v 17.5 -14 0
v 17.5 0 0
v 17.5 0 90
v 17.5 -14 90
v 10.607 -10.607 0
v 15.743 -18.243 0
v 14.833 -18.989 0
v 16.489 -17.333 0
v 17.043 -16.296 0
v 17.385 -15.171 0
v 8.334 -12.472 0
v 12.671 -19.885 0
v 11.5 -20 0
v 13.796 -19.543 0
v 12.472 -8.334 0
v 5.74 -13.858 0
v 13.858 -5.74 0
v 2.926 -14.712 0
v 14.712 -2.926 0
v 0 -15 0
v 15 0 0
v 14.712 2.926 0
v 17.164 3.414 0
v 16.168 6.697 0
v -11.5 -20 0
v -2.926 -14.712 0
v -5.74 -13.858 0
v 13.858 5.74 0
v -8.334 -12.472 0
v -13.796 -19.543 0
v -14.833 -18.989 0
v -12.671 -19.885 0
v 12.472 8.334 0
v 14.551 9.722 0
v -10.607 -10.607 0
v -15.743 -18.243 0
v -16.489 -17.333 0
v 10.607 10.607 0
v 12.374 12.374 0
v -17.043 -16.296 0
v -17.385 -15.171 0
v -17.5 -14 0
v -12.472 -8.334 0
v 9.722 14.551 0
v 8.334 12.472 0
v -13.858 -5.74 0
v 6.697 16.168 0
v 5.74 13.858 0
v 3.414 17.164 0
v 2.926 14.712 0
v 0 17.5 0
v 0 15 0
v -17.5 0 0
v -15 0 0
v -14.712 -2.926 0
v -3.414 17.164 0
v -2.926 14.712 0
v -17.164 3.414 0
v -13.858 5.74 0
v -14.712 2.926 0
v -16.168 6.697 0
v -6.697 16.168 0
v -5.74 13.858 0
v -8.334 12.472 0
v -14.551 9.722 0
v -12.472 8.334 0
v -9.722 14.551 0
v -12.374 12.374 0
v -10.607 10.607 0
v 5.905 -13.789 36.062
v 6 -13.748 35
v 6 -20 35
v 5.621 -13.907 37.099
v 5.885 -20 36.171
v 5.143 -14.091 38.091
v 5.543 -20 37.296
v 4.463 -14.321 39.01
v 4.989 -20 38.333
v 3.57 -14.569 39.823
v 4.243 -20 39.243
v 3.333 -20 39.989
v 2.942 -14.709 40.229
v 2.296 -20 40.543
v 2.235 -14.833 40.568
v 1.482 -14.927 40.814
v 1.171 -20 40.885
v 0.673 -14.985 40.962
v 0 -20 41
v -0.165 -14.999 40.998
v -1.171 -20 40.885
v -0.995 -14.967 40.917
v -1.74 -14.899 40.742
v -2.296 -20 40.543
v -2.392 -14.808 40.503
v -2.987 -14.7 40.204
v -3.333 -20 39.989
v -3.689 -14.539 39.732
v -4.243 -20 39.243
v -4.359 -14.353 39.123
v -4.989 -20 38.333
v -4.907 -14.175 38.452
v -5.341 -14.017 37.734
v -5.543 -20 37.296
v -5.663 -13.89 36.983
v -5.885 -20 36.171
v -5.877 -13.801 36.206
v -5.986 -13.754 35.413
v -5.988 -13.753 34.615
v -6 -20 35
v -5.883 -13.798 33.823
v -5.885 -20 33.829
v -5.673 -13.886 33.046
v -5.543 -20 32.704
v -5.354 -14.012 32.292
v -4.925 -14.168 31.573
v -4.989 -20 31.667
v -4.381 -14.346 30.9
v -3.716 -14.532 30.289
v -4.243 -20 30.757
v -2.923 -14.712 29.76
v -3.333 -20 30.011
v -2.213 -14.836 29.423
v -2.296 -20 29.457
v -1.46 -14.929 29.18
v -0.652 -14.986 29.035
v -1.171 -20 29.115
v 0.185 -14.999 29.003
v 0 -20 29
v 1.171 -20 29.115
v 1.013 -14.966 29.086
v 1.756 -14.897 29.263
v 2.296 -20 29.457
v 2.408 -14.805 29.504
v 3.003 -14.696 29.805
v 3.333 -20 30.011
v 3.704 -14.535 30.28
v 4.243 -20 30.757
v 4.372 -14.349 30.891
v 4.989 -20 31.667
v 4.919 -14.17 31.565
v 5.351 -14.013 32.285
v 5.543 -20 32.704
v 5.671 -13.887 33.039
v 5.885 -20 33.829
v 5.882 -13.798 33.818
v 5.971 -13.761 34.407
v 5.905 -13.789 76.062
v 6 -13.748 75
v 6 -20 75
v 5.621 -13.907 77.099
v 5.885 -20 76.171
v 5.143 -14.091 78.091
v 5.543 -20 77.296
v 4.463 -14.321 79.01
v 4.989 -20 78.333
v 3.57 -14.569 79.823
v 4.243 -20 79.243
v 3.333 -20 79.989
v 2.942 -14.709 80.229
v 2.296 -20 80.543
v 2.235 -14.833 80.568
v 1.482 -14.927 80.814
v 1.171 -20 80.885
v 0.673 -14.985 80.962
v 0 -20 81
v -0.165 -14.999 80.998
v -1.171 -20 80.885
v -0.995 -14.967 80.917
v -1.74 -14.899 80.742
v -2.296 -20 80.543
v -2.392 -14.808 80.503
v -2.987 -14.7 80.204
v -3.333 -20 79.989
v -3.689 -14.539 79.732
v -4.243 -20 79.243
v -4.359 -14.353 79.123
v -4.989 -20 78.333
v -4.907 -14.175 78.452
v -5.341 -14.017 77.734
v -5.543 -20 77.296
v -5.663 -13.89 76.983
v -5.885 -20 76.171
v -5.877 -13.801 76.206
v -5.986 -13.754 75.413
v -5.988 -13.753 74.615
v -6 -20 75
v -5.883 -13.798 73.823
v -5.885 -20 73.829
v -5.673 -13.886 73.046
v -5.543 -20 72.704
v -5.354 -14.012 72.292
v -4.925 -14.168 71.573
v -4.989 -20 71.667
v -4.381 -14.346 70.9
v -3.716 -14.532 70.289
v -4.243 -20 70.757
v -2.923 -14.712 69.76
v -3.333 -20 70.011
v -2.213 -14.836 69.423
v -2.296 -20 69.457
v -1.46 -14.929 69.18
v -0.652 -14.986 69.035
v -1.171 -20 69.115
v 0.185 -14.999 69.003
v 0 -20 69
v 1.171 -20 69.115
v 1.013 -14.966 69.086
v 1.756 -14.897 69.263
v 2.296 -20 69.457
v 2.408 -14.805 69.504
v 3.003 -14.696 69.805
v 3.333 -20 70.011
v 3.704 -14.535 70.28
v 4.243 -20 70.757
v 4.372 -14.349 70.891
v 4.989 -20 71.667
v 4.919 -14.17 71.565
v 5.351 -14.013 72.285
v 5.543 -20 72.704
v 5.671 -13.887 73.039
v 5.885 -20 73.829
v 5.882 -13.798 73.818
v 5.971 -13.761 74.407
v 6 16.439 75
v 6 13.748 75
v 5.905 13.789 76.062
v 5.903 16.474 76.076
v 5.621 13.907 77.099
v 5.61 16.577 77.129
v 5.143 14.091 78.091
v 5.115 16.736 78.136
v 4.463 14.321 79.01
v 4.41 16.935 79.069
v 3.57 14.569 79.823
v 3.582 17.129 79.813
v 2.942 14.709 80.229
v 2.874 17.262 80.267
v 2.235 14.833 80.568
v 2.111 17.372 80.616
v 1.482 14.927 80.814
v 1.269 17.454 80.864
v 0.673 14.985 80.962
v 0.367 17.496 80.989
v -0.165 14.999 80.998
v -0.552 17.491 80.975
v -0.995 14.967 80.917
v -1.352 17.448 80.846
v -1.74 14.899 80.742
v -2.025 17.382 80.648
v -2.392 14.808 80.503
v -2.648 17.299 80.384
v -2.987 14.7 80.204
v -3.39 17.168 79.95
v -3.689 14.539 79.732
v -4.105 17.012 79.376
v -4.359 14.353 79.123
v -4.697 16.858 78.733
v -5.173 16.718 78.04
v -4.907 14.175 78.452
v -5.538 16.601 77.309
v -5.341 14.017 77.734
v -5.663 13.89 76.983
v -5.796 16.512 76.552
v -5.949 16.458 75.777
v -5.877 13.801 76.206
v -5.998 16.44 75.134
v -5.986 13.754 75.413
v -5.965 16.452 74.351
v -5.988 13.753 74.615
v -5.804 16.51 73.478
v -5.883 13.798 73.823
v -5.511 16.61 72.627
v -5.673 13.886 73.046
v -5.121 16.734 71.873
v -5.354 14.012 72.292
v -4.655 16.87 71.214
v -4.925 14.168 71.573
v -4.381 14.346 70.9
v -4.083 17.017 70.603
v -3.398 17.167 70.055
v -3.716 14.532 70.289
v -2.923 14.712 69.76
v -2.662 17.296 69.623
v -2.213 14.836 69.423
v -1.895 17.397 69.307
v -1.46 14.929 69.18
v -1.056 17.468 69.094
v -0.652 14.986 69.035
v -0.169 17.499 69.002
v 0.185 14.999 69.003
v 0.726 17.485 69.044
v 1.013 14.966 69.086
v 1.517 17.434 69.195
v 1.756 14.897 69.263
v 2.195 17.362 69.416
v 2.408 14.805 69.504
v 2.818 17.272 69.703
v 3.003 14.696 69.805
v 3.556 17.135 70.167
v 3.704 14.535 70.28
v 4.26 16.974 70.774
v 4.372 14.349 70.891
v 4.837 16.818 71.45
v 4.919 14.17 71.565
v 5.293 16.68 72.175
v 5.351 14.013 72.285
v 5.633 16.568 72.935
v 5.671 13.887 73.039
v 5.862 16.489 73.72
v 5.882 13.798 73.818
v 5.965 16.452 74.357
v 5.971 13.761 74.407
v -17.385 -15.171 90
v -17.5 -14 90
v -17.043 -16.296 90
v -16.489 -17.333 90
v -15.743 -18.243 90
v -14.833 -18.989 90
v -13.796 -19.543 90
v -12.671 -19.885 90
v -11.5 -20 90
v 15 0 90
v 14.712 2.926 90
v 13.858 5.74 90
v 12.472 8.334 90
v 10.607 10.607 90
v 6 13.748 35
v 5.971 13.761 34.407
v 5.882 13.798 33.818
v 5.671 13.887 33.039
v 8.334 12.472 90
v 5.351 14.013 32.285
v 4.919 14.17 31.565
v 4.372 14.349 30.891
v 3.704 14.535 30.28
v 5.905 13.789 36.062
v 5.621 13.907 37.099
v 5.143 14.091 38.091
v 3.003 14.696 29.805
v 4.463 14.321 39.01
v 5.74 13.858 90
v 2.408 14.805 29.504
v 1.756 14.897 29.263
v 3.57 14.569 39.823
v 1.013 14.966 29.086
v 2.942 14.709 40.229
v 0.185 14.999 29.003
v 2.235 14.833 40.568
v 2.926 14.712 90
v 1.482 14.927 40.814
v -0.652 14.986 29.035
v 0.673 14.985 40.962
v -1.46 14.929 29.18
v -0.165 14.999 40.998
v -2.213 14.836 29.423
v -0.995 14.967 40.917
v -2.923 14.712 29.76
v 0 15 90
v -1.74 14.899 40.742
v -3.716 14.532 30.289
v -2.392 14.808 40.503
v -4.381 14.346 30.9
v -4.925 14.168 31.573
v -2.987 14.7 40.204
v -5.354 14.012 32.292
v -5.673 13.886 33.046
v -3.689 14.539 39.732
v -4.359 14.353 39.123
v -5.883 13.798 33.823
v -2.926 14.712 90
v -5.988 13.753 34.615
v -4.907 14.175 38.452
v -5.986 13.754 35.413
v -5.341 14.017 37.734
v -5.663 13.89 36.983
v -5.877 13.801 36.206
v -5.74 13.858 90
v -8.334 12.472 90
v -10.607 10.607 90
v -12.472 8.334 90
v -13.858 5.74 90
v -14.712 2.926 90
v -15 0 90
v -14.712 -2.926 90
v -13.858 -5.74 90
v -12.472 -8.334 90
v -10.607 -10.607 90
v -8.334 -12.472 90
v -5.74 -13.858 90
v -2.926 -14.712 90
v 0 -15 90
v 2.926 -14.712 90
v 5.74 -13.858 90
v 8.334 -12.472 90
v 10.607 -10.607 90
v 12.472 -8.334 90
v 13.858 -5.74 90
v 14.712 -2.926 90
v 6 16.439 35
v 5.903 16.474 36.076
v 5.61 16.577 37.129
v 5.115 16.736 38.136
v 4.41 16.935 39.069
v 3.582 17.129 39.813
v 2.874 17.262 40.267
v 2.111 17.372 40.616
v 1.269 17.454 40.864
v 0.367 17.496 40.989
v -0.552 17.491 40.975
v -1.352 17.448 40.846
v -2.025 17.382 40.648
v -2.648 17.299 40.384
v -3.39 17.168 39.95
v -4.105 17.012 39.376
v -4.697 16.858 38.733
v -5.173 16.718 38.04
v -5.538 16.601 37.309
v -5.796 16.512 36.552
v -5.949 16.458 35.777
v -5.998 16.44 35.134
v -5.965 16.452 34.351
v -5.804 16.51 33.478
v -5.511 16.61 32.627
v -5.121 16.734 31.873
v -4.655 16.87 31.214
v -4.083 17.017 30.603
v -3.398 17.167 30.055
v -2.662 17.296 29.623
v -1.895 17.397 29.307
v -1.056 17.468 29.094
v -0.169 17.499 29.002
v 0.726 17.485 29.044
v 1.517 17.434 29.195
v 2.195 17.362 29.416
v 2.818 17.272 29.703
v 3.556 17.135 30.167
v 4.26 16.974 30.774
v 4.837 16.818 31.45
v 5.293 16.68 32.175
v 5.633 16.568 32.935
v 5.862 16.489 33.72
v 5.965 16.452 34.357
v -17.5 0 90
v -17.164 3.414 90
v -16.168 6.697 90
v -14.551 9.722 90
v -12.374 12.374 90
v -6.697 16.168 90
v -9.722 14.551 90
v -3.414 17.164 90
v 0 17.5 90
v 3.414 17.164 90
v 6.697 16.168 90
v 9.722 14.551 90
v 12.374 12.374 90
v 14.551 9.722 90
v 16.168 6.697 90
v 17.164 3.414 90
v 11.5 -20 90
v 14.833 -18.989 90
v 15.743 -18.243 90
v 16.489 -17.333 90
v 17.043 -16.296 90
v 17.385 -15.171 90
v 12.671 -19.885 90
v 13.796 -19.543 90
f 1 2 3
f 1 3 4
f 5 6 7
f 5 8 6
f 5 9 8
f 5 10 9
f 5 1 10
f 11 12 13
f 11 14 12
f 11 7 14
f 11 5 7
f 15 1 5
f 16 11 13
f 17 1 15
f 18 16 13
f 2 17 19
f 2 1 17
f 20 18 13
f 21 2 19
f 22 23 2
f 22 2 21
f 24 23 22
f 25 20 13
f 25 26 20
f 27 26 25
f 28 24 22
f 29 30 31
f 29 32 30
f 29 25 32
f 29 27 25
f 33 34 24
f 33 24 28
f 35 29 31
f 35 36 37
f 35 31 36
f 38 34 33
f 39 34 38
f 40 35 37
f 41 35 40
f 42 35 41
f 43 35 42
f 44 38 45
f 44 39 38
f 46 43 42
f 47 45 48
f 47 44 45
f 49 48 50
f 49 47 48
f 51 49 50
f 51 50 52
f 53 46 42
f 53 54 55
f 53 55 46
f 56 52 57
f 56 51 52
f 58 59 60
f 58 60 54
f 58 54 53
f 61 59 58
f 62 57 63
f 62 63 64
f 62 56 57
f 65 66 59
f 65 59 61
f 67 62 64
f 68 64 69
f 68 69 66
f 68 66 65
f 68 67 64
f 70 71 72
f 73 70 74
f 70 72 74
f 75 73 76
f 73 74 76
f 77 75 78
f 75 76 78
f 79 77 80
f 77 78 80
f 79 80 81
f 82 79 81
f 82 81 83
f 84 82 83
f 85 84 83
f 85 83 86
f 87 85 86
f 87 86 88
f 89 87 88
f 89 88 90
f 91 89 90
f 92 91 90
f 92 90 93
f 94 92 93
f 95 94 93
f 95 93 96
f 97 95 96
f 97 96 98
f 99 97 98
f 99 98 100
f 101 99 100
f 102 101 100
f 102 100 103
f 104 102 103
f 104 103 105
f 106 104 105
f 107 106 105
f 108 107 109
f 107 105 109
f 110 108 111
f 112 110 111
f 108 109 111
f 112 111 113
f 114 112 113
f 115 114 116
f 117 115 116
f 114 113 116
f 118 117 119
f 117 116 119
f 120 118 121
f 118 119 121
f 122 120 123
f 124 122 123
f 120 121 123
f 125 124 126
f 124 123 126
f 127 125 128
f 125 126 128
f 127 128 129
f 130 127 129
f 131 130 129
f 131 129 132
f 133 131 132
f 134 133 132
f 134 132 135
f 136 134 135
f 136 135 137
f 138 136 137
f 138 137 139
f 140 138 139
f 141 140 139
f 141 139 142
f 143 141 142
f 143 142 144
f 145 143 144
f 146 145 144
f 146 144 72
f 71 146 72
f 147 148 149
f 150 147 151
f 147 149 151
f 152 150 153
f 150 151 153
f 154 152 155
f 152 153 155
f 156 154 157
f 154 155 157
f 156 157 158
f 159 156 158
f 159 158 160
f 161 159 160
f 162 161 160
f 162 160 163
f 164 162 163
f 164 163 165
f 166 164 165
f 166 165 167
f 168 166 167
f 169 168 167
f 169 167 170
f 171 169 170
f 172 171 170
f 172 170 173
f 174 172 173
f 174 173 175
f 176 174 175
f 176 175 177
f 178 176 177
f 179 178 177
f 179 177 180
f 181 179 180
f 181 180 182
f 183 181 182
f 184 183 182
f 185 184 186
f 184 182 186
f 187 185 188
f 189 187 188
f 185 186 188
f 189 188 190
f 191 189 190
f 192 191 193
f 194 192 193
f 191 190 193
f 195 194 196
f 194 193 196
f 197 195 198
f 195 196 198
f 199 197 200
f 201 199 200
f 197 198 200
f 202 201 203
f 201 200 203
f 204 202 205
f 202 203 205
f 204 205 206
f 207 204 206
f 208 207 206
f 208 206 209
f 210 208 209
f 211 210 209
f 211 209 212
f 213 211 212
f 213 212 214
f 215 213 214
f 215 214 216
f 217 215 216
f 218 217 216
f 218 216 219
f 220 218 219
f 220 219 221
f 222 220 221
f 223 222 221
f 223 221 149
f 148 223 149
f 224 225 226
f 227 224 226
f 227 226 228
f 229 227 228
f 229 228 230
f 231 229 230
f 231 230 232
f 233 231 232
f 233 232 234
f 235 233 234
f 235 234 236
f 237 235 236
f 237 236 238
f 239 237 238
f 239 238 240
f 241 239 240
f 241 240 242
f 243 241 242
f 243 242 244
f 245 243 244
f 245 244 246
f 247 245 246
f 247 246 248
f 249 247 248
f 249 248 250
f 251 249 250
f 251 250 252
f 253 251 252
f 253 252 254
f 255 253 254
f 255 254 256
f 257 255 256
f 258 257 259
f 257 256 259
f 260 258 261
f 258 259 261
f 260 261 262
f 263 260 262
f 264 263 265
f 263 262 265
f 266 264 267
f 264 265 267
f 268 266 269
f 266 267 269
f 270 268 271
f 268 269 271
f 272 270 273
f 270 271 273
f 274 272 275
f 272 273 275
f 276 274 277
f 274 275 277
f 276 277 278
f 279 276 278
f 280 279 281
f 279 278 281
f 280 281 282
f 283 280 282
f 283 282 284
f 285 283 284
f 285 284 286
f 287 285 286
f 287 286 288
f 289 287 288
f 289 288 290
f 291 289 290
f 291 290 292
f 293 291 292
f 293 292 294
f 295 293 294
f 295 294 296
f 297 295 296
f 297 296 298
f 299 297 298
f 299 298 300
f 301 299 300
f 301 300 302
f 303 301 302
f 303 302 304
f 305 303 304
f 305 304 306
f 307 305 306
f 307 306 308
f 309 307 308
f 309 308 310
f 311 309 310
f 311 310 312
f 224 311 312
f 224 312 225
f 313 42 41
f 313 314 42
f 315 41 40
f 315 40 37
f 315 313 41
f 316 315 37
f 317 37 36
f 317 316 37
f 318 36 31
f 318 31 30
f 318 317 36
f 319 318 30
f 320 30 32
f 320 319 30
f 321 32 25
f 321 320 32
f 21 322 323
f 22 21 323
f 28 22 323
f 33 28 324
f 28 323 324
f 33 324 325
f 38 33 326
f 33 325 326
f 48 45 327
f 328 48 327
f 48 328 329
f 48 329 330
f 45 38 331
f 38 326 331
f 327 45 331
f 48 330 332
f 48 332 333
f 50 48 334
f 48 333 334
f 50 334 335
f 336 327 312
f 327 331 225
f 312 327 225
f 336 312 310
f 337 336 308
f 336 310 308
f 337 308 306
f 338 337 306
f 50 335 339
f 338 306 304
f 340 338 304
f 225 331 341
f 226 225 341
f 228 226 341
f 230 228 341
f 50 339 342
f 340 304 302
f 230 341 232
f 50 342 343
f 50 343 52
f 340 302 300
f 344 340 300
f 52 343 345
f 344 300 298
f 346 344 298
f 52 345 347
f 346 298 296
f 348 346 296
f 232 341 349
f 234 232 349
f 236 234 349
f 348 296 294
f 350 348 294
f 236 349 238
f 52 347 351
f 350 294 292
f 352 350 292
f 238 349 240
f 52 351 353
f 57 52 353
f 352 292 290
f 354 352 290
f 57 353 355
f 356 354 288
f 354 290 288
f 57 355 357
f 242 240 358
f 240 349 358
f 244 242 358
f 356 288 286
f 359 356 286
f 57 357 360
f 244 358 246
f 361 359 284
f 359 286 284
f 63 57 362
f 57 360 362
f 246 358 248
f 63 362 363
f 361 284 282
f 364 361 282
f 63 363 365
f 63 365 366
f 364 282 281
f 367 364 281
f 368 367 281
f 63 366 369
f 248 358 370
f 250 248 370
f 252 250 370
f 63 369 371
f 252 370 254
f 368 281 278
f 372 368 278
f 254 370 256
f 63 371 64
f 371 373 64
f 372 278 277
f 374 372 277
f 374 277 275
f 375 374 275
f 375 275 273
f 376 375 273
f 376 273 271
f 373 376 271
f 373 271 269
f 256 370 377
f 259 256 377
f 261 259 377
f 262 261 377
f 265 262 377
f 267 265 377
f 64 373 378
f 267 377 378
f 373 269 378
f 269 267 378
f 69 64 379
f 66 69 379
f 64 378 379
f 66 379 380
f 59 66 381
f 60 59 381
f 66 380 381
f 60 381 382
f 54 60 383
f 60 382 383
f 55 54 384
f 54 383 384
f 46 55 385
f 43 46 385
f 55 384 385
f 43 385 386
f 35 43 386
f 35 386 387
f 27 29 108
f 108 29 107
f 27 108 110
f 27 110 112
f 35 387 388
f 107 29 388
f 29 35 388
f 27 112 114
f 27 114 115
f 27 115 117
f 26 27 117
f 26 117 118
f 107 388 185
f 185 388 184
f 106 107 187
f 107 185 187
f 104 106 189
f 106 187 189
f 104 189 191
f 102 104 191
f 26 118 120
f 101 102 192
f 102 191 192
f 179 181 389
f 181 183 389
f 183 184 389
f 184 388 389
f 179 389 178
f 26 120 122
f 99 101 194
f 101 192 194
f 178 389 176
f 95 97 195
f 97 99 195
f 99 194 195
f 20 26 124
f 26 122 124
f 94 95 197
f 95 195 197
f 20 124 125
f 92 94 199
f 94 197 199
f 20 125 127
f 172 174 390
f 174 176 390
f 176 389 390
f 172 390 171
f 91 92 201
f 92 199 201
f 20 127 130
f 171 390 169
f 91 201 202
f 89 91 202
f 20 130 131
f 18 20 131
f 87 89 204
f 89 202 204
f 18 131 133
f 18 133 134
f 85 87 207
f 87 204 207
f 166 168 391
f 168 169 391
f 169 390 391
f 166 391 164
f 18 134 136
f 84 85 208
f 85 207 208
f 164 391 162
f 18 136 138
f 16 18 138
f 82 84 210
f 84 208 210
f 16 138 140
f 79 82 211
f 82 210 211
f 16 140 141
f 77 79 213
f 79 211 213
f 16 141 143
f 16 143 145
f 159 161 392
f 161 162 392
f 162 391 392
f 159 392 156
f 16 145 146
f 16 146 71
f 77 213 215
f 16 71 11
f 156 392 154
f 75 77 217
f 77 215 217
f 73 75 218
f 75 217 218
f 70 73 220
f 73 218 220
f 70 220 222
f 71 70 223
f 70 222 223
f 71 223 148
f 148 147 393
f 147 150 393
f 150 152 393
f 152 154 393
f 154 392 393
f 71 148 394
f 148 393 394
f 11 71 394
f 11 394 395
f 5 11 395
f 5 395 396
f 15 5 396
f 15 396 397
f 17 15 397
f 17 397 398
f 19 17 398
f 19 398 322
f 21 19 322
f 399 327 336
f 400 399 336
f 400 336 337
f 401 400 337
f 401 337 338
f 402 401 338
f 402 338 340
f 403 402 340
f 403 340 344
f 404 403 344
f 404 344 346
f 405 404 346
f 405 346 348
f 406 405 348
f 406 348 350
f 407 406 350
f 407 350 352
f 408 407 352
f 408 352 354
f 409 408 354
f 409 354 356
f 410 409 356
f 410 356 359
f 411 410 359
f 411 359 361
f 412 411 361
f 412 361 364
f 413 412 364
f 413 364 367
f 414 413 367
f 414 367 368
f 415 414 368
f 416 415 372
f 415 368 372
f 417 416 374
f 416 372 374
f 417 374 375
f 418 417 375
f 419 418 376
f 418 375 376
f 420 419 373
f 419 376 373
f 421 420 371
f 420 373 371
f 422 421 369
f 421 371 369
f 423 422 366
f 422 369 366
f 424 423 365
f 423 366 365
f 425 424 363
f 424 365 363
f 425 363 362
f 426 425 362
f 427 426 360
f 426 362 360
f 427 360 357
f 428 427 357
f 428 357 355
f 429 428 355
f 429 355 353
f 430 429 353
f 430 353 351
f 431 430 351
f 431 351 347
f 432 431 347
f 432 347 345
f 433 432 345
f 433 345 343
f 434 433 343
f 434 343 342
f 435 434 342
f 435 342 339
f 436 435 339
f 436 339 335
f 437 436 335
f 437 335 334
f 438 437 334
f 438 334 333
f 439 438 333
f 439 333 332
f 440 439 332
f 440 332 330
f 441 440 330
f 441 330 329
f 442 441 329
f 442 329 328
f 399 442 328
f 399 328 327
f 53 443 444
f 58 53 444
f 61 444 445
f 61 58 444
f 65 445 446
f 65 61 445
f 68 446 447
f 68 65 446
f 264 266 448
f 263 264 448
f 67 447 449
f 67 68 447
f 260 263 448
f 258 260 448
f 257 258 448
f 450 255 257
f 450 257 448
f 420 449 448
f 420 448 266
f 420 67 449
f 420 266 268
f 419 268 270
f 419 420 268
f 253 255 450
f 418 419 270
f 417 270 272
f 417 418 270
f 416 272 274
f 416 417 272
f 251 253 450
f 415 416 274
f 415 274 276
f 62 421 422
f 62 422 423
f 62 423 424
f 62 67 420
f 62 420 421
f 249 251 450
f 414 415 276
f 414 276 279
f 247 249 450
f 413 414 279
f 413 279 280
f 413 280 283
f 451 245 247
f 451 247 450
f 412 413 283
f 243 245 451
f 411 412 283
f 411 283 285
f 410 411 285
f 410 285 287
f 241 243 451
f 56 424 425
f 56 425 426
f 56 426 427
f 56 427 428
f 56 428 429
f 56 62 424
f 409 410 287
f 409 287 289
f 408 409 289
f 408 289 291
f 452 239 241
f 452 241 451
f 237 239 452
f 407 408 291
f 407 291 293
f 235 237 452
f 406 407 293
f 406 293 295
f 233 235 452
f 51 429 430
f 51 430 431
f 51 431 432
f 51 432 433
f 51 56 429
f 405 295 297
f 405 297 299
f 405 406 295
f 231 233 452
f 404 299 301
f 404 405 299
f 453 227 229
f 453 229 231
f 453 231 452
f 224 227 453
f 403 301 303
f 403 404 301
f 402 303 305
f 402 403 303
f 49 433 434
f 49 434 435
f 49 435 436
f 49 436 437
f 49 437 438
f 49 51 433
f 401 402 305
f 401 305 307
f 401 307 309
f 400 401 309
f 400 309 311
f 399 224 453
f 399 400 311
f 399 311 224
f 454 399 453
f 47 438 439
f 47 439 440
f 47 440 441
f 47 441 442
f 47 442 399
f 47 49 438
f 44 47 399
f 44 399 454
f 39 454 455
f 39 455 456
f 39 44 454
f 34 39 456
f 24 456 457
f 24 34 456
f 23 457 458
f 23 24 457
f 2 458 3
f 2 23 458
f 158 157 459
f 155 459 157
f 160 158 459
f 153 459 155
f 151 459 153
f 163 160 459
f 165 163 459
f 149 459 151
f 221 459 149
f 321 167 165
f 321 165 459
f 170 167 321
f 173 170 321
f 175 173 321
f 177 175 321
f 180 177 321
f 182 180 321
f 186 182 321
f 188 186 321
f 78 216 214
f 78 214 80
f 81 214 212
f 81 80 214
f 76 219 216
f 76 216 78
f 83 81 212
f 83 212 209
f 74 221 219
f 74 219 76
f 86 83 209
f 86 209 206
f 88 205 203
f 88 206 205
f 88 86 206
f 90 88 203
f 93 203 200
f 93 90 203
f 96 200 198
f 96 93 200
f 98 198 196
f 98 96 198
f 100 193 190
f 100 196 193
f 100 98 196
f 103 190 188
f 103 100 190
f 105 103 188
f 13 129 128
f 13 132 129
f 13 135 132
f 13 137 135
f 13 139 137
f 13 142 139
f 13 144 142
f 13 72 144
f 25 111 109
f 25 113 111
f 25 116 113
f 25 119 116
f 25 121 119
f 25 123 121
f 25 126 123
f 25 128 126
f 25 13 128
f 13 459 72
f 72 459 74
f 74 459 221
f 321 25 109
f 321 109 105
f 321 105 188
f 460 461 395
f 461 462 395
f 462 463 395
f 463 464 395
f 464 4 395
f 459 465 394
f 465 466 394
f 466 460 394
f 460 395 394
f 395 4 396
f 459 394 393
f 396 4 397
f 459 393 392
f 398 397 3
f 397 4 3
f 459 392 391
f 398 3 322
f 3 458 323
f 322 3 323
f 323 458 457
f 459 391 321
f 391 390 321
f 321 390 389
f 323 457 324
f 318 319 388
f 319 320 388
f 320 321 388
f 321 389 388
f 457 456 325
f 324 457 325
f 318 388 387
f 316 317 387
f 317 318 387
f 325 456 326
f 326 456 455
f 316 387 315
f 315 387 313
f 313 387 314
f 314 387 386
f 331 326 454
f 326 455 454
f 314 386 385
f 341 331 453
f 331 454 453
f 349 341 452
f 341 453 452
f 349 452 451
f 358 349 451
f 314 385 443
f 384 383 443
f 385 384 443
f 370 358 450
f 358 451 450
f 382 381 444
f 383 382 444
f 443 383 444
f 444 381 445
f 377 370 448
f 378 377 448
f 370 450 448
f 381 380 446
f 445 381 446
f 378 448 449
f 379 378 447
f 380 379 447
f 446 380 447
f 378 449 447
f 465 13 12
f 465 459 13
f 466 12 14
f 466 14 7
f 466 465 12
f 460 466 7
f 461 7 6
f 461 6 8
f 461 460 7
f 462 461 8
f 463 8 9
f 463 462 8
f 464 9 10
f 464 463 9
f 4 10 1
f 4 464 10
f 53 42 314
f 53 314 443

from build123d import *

# Parameters (mm, degrees)
BASE_EXTRUDE_DEPTH = 90
SKETCH2_R          = 15
CUT_EXTRUDE1_DEPTH = 94.841621896
SKETCH3_R          = 6
CUT_EXTRUDE2_DEPTH = 100.058063781
FILLET1_R          = 6


with BuildPart() as part:
    # Sketch1 → Base-Extrude (new body)
    with BuildSketch(Plane.XY):
        with BuildLine():
            Line((-17.5, -20), (-17.5, 0))
            ThreePointArc((-17.5, 0), (0, 17.5), (17.5, 0))
            Line((17.5, 0), (17.5, -20))
            Line((17.5, -20), (-17.5, -20))
        make_face()
    extrude(amount=BASE_EXTRUDE_DEPTH)

    # Sketch2 → Cut-Extrude1 (cut, through all)
    with BuildSketch(Plane.XY.offset(90)):
        Circle(SKETCH2_R)
    extrude(amount=-CUT_EXTRUDE1_DEPTH, mode=Mode.SUBTRACT)

    # Sketch3 → Cut-Extrude2 (cut, through all)
    with BuildSketch(Plane.XZ.offset(20)):
        with Locations((0, 35)):
            Circle(SKETCH3_R)
        with Locations((0, 75)):
            Circle(SKETCH3_R)
    extrude(amount=-CUT_EXTRUDE2_DEPTH, mode=Mode.SUBTRACT)

    # Fillet1
    fillet1_edges = [part.edges().sort_by_distance(p)[0] for p in [
        (17.5, -20, 45),
        (-17.5, -20, 45),
    ]]
    fillet(fillet1_edges, radius=FILLET1_R)


solid = part.part
